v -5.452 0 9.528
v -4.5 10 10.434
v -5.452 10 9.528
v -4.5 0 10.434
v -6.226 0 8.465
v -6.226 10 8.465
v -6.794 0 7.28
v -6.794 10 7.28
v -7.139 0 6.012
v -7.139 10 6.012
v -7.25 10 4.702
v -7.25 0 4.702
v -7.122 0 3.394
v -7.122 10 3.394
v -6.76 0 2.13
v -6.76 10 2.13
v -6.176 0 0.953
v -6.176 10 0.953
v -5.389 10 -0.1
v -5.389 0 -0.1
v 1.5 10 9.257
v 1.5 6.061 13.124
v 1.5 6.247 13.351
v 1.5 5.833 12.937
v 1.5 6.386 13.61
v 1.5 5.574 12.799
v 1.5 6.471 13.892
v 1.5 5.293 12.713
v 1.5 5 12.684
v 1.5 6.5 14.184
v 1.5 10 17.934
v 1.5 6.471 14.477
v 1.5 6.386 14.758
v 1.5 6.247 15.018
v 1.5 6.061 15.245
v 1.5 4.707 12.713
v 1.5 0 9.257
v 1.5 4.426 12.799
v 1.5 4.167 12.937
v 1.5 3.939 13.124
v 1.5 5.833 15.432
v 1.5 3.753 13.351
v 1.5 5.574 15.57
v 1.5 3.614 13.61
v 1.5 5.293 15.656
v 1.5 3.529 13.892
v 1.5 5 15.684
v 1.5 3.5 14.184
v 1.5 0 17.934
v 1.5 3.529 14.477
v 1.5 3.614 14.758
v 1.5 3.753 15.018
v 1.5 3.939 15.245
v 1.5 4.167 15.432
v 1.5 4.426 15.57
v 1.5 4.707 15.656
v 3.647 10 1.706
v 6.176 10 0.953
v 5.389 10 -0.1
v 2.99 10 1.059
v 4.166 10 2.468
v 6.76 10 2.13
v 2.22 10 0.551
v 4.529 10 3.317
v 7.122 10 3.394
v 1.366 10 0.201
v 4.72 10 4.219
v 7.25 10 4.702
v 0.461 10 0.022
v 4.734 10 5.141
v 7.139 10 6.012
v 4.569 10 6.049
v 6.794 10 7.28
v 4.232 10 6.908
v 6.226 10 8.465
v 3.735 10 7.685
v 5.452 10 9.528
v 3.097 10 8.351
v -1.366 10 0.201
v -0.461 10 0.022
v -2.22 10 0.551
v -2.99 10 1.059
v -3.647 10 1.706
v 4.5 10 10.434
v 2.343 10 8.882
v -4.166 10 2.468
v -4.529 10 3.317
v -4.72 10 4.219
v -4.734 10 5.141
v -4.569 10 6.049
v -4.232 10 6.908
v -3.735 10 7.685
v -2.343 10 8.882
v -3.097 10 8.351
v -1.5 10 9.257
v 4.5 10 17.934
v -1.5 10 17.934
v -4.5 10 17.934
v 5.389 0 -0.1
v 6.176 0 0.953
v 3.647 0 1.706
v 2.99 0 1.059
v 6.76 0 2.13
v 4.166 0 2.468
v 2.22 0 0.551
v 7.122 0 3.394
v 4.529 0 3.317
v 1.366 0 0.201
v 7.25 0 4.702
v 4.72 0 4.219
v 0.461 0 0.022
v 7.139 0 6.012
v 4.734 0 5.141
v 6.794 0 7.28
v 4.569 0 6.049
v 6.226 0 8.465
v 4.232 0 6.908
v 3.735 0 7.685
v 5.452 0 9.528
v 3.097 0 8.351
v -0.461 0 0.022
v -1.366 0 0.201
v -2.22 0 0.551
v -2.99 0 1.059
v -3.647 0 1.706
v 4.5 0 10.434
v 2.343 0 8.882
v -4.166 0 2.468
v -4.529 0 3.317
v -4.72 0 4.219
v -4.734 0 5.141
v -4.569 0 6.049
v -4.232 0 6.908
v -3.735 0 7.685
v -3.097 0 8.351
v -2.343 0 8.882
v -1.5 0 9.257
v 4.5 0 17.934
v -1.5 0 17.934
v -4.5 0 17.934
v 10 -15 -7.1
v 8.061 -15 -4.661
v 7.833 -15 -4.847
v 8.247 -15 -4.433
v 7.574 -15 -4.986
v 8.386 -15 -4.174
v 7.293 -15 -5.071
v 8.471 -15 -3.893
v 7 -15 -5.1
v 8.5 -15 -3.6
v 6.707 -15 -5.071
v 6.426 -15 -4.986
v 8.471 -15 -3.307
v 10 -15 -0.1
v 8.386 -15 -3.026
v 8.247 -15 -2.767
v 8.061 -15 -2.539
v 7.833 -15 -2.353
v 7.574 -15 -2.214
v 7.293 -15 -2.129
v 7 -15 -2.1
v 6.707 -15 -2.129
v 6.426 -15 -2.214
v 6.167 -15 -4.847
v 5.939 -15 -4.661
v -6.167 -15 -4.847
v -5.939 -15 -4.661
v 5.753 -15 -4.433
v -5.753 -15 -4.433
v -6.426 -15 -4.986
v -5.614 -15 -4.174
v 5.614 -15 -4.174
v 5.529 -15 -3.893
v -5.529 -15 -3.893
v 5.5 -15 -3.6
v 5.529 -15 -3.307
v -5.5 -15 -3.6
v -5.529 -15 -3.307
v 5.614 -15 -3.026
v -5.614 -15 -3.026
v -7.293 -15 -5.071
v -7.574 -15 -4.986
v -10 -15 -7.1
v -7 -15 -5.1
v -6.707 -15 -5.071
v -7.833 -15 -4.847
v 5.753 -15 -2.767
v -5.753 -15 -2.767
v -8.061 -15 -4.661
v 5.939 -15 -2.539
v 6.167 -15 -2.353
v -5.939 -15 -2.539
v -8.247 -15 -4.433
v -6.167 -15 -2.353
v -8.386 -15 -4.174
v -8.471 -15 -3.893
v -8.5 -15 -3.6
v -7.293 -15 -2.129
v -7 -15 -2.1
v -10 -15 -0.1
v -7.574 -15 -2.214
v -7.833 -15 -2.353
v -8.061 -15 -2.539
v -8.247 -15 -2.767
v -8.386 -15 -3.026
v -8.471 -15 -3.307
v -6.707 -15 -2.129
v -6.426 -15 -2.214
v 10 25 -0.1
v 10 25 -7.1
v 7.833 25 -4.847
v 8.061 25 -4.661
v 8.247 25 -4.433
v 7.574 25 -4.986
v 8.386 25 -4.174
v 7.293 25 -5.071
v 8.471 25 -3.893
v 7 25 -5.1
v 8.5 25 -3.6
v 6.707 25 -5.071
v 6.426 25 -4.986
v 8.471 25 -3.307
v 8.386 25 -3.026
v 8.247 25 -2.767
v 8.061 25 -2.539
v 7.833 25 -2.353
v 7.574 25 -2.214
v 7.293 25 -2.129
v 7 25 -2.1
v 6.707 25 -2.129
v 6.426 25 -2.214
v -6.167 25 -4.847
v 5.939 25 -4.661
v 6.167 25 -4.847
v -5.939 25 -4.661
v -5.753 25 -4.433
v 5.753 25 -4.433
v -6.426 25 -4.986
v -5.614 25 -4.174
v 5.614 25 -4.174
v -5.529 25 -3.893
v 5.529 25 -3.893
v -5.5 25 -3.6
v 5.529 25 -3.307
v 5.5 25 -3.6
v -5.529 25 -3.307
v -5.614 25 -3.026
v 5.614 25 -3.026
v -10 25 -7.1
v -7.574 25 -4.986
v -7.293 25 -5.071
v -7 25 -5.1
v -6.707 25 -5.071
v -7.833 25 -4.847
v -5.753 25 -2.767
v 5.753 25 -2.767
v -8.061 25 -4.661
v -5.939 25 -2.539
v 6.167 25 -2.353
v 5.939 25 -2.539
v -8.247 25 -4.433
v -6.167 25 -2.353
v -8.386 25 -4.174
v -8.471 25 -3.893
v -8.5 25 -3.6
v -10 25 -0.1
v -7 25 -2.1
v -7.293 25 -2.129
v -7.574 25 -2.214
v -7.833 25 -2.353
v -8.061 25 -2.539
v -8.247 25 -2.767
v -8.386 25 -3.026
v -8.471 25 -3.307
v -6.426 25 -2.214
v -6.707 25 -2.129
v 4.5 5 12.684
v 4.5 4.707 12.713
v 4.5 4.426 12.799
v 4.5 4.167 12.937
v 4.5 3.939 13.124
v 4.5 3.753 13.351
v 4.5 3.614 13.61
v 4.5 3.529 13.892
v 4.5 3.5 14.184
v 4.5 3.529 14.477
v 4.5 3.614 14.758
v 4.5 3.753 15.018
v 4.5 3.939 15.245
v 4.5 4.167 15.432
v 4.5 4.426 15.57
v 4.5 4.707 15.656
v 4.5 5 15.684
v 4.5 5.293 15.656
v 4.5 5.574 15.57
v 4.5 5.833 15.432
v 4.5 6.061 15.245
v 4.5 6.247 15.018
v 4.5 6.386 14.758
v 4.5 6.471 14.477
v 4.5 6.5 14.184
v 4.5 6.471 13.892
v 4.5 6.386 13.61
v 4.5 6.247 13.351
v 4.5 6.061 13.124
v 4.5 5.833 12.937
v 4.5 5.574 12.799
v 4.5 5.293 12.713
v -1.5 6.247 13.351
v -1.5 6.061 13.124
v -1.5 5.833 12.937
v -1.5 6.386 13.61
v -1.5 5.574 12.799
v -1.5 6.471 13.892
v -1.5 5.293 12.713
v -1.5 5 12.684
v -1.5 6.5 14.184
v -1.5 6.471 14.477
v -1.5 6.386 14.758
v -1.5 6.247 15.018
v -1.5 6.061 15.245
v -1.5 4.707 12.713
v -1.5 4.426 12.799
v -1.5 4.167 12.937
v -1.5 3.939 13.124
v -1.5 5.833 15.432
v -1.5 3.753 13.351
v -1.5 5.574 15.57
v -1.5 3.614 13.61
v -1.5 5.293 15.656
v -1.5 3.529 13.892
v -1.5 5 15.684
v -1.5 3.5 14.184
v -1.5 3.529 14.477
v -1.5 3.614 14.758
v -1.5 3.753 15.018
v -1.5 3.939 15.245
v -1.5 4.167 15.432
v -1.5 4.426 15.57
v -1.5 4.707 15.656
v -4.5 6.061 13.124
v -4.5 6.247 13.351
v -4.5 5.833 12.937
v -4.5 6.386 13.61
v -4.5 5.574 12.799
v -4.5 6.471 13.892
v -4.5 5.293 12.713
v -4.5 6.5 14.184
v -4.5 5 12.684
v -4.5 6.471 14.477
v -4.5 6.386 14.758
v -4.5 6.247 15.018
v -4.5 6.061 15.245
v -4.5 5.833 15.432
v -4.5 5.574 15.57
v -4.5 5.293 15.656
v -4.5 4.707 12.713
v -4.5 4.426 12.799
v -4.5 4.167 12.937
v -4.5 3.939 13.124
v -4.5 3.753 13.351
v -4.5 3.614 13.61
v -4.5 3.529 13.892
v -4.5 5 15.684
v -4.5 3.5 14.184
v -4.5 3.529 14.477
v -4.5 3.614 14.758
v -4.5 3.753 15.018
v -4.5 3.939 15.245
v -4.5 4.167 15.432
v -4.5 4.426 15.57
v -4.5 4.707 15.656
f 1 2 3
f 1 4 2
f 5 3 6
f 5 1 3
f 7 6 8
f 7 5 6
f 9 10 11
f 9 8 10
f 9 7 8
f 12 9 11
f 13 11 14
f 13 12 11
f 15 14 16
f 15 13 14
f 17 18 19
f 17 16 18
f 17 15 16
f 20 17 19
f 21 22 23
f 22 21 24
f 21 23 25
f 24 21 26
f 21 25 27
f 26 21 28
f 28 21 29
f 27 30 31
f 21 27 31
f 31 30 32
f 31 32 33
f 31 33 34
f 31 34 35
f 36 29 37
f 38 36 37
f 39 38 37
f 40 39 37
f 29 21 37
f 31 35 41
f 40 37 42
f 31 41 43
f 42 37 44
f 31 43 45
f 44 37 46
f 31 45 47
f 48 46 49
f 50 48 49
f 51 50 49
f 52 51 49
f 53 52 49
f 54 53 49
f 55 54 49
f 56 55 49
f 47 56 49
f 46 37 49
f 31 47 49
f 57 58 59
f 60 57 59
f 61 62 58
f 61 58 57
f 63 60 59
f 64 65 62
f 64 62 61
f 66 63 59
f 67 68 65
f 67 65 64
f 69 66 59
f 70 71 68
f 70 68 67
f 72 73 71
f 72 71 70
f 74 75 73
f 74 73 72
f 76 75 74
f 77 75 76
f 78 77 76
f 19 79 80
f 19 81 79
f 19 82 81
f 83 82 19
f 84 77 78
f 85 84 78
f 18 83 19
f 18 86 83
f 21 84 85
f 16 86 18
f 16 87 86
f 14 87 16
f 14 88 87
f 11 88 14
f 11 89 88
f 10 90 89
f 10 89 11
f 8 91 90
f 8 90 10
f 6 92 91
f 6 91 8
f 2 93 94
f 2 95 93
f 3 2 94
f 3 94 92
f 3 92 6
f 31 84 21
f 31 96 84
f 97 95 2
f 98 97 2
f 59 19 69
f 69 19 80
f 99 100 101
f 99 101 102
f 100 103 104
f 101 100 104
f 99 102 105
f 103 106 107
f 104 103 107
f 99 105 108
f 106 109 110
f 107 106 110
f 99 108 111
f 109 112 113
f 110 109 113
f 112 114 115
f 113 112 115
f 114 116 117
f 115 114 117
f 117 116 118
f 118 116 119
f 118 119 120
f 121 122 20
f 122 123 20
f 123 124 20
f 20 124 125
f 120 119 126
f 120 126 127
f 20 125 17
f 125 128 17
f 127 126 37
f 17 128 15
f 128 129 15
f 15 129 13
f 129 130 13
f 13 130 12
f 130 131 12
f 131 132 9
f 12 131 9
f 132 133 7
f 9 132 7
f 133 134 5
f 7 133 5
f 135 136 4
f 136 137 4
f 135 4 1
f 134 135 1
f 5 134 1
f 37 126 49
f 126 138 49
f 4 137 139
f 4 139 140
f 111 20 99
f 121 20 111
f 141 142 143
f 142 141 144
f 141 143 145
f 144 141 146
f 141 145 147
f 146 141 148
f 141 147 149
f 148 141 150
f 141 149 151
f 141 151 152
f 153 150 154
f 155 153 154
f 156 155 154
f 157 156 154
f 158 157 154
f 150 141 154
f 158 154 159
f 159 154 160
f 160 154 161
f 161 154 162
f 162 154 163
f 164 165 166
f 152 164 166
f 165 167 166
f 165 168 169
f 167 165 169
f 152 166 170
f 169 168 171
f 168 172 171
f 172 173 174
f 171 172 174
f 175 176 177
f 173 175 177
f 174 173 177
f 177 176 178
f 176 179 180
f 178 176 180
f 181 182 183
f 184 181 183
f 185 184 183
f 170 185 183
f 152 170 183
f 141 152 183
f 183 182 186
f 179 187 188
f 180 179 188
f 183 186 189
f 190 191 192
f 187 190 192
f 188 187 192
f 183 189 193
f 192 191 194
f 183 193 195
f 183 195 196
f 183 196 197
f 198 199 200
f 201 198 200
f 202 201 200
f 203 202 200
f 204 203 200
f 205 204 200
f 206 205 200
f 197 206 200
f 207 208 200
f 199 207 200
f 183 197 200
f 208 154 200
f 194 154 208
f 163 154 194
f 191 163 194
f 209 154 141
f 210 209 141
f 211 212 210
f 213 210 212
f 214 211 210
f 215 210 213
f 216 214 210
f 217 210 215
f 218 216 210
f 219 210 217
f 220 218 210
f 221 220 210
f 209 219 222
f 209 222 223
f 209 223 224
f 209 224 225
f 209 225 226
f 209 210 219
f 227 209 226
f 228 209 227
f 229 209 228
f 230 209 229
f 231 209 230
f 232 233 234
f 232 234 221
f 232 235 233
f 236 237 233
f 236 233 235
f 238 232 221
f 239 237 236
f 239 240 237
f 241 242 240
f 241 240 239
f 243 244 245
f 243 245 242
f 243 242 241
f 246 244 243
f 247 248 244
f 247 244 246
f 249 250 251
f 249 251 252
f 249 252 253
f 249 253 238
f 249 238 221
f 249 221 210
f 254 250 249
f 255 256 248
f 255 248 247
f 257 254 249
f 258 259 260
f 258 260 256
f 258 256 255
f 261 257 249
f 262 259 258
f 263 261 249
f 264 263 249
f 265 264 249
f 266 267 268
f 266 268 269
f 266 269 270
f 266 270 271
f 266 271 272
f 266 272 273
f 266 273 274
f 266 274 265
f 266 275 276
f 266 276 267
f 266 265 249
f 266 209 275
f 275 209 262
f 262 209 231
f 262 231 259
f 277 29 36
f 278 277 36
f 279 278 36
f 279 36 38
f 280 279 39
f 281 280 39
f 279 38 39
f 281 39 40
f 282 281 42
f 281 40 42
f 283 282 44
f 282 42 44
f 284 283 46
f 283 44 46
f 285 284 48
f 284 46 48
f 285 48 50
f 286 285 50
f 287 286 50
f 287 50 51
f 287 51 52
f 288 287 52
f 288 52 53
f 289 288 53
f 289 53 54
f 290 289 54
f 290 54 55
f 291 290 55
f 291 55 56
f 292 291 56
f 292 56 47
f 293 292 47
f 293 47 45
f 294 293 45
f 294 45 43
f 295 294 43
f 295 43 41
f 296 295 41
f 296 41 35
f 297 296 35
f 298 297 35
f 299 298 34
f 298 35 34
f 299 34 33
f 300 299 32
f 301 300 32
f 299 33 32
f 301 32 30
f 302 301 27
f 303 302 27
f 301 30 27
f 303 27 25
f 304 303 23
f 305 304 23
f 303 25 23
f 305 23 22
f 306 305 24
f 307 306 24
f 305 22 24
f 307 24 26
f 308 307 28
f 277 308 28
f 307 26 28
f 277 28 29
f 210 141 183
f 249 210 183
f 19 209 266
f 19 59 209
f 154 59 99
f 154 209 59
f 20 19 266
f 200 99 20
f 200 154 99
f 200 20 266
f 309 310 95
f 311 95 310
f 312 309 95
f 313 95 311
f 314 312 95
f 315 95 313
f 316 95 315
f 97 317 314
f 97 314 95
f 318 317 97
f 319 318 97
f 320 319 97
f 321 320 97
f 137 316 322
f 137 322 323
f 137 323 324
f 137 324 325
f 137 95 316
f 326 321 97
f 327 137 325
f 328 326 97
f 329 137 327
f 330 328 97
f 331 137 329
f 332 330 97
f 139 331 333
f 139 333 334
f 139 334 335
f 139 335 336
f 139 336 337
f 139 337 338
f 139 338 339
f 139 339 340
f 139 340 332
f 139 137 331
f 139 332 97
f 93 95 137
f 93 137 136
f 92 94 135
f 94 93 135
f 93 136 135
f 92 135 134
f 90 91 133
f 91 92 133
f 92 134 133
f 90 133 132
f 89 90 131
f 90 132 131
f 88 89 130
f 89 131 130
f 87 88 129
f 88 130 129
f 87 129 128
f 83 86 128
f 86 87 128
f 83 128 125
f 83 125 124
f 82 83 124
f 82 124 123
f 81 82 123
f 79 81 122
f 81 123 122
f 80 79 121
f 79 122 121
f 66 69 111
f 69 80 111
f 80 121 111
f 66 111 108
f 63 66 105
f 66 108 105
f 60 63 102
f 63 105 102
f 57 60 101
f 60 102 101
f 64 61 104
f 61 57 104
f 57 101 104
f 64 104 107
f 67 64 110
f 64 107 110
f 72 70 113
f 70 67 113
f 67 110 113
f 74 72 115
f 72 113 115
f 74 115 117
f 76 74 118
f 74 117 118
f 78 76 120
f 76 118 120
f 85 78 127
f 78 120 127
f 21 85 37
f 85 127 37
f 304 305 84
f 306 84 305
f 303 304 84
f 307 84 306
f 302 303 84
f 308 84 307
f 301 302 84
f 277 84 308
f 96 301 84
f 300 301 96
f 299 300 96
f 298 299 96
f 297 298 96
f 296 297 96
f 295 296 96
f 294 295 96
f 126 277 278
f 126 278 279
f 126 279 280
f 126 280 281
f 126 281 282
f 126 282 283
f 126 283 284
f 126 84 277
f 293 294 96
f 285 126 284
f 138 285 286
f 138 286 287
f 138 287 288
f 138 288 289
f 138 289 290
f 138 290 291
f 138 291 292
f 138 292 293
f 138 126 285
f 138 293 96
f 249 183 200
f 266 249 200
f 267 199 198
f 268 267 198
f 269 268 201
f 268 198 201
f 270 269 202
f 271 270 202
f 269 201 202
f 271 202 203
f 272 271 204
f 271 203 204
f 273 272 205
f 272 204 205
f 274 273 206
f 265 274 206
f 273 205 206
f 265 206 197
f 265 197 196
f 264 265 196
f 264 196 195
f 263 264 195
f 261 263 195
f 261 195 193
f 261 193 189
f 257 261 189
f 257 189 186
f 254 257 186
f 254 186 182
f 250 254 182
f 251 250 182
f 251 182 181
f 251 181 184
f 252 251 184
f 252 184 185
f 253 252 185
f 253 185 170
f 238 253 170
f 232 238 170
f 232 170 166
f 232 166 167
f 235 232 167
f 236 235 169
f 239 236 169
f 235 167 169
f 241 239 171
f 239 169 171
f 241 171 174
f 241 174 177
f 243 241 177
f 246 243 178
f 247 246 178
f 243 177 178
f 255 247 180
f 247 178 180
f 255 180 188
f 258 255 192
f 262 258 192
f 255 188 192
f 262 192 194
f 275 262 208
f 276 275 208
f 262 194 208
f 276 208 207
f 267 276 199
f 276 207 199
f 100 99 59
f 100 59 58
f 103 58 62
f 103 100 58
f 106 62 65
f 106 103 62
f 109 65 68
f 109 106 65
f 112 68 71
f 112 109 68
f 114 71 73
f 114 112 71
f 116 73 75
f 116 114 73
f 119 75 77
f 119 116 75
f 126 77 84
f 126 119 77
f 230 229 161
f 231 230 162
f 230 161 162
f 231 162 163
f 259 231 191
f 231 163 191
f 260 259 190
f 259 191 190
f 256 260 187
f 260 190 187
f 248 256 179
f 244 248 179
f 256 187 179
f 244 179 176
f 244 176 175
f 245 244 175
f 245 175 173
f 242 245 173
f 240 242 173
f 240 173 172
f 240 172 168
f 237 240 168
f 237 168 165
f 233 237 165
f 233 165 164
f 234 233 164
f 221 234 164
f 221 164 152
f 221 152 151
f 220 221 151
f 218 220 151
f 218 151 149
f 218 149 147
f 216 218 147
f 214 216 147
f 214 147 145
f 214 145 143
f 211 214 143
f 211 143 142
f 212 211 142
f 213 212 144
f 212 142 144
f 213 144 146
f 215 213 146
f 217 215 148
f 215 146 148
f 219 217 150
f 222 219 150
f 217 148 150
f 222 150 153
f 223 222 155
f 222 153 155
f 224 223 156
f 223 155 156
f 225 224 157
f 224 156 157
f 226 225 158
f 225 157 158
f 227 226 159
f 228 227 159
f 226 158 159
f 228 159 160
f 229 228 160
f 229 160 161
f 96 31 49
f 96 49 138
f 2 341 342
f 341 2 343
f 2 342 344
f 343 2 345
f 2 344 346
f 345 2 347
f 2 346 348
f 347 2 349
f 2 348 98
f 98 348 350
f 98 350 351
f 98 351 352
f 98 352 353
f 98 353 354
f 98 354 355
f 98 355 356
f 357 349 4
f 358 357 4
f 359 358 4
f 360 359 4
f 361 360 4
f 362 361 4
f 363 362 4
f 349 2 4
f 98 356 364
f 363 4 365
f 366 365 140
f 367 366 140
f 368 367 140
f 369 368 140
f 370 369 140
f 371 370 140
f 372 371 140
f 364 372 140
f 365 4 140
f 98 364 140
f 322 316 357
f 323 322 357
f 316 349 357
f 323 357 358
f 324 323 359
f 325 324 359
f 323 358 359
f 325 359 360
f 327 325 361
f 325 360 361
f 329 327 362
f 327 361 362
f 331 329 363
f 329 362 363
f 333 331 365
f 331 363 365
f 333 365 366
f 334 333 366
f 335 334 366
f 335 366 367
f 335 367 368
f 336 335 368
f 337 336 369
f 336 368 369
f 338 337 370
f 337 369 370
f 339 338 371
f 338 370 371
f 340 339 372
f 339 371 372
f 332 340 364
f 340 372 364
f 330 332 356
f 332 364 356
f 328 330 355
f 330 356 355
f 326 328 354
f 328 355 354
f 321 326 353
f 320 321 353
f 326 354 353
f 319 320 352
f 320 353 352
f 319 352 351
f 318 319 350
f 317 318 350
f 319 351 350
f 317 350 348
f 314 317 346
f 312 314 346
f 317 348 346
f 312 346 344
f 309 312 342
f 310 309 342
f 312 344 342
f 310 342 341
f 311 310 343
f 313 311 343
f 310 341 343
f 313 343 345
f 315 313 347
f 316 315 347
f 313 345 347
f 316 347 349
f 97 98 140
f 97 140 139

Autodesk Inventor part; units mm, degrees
ref_plane "YZ Plane" through (0, 0, 0) normal (1, 0, 0) x (0, 1, 0)
ref_plane "XZ Plane" through (0, 0, 0) normal (0, 1, 0) x (-1, 0, 0)
ref_plane "XY Plane" through (0, 0, 0) normal (0, 0, 1) x (1, 0, 0)
sketch "Sketch1" plane through (0, 0, 0) normal (0, 1, 0) x (-1, 0, 0)
  arc A0 (-1.5, 9.2569) -> (1.5, 9.2569) centre (0, 4.75) ccw
  arc A1 (5.3889, -0.1) -> (4.5, 10.4344) centre (0, 4.75) ccw
  arc A2 (-4.5, 10.4344) -> (-5.3889, -0.1) centre (0, 4.75) ccw
  line L0 (-4.5, 10.4344) -> (-4.5, 17.9344)
  line L1 (4.5, 10.4344) -> (4.5, 17.9344)
  line L2 (-1.5, 9.2569) -> (-1.5, 17.9344)
  line L3 (1.5, 9.2569) -> (1.5, 17.9344)
  line L4 (4.5, 17.9344) -> (1.5, 17.9344)
  line L5 (-1.5, 17.9344) -> (-4.5, 17.9344)
  line L6 (5.3889, -0.1) -> (-5.3889, -0.1)
  point P0 (0, 0)
extrude "Extrusion1" add sketch "Sketch1" along normal blind 10
sketch "Sketch2" plane through (0, 0, 0) normal (0, 1, 0) x (-1, 0, 0)
  line L0 (-5.3889, -0.1) -> (5.3889, -0.1) projected
  line L1 (0, -0.1) -> (-10, -0.1)
  line L2 (0, -0.1) -> (10, -0.1)
  line L3 (-10, -0.1) -> (-10, -7.1)
  line L4 (-10, -7.1) -> (10, -7.1)
  line L5 (10, -7.1) -> (10, -0.1)
  point P0 (0, 0)
  dimension "d13" = 10
  dimension "d14" = 10
  dimension "d15" = 7
  dimension "d16" = 20
  dimension "d17" = 7
extrude "Extrusion2" add sketch "Sketch2" along normal blind 25 and the other way blind 15
sketch "Sketch3" plane through (0, 25, 0) normal (0, 1, 0) x (1, 0, 0)
  line L0 (-10, 0.1) -> (10, 0.1) projected
  line L1 (10, 7.1) -> (10, 0.1) projected
  circle A0 centre (7, 3.6) radius 1.5
  line L2 (-10, 7.1) -> (-10, 0.1) projected
  circle A1 centre (-7, 3.6) radius 1.5
  point P0 (0, 0)
  dimension "d24" = 3
  dimension "d27" = 3
hole "Hole1" at (-7, 25, -3.6) at (7, 25, -3.6) direction (0, -1, 0) diameter 3 end through all both
sketch "Sketch4" plane through (4.5, 0, 17.9344) normal (1, 0, 0) x (0, 0, -1)
  line L0 (0, 10) -> (8.6775, 10) projected
  circle A0 centre (3.75, 5) radius 1.5
  point P0 (17.9344, 0)
  point P1 (0, 0)
  point P2 (7.5, 0)
  dimension "d36" = 3
hole "Hole2" at (4.5, 5, 14.1844) direction (-1, 0, 0) diameter 3 end through all both
